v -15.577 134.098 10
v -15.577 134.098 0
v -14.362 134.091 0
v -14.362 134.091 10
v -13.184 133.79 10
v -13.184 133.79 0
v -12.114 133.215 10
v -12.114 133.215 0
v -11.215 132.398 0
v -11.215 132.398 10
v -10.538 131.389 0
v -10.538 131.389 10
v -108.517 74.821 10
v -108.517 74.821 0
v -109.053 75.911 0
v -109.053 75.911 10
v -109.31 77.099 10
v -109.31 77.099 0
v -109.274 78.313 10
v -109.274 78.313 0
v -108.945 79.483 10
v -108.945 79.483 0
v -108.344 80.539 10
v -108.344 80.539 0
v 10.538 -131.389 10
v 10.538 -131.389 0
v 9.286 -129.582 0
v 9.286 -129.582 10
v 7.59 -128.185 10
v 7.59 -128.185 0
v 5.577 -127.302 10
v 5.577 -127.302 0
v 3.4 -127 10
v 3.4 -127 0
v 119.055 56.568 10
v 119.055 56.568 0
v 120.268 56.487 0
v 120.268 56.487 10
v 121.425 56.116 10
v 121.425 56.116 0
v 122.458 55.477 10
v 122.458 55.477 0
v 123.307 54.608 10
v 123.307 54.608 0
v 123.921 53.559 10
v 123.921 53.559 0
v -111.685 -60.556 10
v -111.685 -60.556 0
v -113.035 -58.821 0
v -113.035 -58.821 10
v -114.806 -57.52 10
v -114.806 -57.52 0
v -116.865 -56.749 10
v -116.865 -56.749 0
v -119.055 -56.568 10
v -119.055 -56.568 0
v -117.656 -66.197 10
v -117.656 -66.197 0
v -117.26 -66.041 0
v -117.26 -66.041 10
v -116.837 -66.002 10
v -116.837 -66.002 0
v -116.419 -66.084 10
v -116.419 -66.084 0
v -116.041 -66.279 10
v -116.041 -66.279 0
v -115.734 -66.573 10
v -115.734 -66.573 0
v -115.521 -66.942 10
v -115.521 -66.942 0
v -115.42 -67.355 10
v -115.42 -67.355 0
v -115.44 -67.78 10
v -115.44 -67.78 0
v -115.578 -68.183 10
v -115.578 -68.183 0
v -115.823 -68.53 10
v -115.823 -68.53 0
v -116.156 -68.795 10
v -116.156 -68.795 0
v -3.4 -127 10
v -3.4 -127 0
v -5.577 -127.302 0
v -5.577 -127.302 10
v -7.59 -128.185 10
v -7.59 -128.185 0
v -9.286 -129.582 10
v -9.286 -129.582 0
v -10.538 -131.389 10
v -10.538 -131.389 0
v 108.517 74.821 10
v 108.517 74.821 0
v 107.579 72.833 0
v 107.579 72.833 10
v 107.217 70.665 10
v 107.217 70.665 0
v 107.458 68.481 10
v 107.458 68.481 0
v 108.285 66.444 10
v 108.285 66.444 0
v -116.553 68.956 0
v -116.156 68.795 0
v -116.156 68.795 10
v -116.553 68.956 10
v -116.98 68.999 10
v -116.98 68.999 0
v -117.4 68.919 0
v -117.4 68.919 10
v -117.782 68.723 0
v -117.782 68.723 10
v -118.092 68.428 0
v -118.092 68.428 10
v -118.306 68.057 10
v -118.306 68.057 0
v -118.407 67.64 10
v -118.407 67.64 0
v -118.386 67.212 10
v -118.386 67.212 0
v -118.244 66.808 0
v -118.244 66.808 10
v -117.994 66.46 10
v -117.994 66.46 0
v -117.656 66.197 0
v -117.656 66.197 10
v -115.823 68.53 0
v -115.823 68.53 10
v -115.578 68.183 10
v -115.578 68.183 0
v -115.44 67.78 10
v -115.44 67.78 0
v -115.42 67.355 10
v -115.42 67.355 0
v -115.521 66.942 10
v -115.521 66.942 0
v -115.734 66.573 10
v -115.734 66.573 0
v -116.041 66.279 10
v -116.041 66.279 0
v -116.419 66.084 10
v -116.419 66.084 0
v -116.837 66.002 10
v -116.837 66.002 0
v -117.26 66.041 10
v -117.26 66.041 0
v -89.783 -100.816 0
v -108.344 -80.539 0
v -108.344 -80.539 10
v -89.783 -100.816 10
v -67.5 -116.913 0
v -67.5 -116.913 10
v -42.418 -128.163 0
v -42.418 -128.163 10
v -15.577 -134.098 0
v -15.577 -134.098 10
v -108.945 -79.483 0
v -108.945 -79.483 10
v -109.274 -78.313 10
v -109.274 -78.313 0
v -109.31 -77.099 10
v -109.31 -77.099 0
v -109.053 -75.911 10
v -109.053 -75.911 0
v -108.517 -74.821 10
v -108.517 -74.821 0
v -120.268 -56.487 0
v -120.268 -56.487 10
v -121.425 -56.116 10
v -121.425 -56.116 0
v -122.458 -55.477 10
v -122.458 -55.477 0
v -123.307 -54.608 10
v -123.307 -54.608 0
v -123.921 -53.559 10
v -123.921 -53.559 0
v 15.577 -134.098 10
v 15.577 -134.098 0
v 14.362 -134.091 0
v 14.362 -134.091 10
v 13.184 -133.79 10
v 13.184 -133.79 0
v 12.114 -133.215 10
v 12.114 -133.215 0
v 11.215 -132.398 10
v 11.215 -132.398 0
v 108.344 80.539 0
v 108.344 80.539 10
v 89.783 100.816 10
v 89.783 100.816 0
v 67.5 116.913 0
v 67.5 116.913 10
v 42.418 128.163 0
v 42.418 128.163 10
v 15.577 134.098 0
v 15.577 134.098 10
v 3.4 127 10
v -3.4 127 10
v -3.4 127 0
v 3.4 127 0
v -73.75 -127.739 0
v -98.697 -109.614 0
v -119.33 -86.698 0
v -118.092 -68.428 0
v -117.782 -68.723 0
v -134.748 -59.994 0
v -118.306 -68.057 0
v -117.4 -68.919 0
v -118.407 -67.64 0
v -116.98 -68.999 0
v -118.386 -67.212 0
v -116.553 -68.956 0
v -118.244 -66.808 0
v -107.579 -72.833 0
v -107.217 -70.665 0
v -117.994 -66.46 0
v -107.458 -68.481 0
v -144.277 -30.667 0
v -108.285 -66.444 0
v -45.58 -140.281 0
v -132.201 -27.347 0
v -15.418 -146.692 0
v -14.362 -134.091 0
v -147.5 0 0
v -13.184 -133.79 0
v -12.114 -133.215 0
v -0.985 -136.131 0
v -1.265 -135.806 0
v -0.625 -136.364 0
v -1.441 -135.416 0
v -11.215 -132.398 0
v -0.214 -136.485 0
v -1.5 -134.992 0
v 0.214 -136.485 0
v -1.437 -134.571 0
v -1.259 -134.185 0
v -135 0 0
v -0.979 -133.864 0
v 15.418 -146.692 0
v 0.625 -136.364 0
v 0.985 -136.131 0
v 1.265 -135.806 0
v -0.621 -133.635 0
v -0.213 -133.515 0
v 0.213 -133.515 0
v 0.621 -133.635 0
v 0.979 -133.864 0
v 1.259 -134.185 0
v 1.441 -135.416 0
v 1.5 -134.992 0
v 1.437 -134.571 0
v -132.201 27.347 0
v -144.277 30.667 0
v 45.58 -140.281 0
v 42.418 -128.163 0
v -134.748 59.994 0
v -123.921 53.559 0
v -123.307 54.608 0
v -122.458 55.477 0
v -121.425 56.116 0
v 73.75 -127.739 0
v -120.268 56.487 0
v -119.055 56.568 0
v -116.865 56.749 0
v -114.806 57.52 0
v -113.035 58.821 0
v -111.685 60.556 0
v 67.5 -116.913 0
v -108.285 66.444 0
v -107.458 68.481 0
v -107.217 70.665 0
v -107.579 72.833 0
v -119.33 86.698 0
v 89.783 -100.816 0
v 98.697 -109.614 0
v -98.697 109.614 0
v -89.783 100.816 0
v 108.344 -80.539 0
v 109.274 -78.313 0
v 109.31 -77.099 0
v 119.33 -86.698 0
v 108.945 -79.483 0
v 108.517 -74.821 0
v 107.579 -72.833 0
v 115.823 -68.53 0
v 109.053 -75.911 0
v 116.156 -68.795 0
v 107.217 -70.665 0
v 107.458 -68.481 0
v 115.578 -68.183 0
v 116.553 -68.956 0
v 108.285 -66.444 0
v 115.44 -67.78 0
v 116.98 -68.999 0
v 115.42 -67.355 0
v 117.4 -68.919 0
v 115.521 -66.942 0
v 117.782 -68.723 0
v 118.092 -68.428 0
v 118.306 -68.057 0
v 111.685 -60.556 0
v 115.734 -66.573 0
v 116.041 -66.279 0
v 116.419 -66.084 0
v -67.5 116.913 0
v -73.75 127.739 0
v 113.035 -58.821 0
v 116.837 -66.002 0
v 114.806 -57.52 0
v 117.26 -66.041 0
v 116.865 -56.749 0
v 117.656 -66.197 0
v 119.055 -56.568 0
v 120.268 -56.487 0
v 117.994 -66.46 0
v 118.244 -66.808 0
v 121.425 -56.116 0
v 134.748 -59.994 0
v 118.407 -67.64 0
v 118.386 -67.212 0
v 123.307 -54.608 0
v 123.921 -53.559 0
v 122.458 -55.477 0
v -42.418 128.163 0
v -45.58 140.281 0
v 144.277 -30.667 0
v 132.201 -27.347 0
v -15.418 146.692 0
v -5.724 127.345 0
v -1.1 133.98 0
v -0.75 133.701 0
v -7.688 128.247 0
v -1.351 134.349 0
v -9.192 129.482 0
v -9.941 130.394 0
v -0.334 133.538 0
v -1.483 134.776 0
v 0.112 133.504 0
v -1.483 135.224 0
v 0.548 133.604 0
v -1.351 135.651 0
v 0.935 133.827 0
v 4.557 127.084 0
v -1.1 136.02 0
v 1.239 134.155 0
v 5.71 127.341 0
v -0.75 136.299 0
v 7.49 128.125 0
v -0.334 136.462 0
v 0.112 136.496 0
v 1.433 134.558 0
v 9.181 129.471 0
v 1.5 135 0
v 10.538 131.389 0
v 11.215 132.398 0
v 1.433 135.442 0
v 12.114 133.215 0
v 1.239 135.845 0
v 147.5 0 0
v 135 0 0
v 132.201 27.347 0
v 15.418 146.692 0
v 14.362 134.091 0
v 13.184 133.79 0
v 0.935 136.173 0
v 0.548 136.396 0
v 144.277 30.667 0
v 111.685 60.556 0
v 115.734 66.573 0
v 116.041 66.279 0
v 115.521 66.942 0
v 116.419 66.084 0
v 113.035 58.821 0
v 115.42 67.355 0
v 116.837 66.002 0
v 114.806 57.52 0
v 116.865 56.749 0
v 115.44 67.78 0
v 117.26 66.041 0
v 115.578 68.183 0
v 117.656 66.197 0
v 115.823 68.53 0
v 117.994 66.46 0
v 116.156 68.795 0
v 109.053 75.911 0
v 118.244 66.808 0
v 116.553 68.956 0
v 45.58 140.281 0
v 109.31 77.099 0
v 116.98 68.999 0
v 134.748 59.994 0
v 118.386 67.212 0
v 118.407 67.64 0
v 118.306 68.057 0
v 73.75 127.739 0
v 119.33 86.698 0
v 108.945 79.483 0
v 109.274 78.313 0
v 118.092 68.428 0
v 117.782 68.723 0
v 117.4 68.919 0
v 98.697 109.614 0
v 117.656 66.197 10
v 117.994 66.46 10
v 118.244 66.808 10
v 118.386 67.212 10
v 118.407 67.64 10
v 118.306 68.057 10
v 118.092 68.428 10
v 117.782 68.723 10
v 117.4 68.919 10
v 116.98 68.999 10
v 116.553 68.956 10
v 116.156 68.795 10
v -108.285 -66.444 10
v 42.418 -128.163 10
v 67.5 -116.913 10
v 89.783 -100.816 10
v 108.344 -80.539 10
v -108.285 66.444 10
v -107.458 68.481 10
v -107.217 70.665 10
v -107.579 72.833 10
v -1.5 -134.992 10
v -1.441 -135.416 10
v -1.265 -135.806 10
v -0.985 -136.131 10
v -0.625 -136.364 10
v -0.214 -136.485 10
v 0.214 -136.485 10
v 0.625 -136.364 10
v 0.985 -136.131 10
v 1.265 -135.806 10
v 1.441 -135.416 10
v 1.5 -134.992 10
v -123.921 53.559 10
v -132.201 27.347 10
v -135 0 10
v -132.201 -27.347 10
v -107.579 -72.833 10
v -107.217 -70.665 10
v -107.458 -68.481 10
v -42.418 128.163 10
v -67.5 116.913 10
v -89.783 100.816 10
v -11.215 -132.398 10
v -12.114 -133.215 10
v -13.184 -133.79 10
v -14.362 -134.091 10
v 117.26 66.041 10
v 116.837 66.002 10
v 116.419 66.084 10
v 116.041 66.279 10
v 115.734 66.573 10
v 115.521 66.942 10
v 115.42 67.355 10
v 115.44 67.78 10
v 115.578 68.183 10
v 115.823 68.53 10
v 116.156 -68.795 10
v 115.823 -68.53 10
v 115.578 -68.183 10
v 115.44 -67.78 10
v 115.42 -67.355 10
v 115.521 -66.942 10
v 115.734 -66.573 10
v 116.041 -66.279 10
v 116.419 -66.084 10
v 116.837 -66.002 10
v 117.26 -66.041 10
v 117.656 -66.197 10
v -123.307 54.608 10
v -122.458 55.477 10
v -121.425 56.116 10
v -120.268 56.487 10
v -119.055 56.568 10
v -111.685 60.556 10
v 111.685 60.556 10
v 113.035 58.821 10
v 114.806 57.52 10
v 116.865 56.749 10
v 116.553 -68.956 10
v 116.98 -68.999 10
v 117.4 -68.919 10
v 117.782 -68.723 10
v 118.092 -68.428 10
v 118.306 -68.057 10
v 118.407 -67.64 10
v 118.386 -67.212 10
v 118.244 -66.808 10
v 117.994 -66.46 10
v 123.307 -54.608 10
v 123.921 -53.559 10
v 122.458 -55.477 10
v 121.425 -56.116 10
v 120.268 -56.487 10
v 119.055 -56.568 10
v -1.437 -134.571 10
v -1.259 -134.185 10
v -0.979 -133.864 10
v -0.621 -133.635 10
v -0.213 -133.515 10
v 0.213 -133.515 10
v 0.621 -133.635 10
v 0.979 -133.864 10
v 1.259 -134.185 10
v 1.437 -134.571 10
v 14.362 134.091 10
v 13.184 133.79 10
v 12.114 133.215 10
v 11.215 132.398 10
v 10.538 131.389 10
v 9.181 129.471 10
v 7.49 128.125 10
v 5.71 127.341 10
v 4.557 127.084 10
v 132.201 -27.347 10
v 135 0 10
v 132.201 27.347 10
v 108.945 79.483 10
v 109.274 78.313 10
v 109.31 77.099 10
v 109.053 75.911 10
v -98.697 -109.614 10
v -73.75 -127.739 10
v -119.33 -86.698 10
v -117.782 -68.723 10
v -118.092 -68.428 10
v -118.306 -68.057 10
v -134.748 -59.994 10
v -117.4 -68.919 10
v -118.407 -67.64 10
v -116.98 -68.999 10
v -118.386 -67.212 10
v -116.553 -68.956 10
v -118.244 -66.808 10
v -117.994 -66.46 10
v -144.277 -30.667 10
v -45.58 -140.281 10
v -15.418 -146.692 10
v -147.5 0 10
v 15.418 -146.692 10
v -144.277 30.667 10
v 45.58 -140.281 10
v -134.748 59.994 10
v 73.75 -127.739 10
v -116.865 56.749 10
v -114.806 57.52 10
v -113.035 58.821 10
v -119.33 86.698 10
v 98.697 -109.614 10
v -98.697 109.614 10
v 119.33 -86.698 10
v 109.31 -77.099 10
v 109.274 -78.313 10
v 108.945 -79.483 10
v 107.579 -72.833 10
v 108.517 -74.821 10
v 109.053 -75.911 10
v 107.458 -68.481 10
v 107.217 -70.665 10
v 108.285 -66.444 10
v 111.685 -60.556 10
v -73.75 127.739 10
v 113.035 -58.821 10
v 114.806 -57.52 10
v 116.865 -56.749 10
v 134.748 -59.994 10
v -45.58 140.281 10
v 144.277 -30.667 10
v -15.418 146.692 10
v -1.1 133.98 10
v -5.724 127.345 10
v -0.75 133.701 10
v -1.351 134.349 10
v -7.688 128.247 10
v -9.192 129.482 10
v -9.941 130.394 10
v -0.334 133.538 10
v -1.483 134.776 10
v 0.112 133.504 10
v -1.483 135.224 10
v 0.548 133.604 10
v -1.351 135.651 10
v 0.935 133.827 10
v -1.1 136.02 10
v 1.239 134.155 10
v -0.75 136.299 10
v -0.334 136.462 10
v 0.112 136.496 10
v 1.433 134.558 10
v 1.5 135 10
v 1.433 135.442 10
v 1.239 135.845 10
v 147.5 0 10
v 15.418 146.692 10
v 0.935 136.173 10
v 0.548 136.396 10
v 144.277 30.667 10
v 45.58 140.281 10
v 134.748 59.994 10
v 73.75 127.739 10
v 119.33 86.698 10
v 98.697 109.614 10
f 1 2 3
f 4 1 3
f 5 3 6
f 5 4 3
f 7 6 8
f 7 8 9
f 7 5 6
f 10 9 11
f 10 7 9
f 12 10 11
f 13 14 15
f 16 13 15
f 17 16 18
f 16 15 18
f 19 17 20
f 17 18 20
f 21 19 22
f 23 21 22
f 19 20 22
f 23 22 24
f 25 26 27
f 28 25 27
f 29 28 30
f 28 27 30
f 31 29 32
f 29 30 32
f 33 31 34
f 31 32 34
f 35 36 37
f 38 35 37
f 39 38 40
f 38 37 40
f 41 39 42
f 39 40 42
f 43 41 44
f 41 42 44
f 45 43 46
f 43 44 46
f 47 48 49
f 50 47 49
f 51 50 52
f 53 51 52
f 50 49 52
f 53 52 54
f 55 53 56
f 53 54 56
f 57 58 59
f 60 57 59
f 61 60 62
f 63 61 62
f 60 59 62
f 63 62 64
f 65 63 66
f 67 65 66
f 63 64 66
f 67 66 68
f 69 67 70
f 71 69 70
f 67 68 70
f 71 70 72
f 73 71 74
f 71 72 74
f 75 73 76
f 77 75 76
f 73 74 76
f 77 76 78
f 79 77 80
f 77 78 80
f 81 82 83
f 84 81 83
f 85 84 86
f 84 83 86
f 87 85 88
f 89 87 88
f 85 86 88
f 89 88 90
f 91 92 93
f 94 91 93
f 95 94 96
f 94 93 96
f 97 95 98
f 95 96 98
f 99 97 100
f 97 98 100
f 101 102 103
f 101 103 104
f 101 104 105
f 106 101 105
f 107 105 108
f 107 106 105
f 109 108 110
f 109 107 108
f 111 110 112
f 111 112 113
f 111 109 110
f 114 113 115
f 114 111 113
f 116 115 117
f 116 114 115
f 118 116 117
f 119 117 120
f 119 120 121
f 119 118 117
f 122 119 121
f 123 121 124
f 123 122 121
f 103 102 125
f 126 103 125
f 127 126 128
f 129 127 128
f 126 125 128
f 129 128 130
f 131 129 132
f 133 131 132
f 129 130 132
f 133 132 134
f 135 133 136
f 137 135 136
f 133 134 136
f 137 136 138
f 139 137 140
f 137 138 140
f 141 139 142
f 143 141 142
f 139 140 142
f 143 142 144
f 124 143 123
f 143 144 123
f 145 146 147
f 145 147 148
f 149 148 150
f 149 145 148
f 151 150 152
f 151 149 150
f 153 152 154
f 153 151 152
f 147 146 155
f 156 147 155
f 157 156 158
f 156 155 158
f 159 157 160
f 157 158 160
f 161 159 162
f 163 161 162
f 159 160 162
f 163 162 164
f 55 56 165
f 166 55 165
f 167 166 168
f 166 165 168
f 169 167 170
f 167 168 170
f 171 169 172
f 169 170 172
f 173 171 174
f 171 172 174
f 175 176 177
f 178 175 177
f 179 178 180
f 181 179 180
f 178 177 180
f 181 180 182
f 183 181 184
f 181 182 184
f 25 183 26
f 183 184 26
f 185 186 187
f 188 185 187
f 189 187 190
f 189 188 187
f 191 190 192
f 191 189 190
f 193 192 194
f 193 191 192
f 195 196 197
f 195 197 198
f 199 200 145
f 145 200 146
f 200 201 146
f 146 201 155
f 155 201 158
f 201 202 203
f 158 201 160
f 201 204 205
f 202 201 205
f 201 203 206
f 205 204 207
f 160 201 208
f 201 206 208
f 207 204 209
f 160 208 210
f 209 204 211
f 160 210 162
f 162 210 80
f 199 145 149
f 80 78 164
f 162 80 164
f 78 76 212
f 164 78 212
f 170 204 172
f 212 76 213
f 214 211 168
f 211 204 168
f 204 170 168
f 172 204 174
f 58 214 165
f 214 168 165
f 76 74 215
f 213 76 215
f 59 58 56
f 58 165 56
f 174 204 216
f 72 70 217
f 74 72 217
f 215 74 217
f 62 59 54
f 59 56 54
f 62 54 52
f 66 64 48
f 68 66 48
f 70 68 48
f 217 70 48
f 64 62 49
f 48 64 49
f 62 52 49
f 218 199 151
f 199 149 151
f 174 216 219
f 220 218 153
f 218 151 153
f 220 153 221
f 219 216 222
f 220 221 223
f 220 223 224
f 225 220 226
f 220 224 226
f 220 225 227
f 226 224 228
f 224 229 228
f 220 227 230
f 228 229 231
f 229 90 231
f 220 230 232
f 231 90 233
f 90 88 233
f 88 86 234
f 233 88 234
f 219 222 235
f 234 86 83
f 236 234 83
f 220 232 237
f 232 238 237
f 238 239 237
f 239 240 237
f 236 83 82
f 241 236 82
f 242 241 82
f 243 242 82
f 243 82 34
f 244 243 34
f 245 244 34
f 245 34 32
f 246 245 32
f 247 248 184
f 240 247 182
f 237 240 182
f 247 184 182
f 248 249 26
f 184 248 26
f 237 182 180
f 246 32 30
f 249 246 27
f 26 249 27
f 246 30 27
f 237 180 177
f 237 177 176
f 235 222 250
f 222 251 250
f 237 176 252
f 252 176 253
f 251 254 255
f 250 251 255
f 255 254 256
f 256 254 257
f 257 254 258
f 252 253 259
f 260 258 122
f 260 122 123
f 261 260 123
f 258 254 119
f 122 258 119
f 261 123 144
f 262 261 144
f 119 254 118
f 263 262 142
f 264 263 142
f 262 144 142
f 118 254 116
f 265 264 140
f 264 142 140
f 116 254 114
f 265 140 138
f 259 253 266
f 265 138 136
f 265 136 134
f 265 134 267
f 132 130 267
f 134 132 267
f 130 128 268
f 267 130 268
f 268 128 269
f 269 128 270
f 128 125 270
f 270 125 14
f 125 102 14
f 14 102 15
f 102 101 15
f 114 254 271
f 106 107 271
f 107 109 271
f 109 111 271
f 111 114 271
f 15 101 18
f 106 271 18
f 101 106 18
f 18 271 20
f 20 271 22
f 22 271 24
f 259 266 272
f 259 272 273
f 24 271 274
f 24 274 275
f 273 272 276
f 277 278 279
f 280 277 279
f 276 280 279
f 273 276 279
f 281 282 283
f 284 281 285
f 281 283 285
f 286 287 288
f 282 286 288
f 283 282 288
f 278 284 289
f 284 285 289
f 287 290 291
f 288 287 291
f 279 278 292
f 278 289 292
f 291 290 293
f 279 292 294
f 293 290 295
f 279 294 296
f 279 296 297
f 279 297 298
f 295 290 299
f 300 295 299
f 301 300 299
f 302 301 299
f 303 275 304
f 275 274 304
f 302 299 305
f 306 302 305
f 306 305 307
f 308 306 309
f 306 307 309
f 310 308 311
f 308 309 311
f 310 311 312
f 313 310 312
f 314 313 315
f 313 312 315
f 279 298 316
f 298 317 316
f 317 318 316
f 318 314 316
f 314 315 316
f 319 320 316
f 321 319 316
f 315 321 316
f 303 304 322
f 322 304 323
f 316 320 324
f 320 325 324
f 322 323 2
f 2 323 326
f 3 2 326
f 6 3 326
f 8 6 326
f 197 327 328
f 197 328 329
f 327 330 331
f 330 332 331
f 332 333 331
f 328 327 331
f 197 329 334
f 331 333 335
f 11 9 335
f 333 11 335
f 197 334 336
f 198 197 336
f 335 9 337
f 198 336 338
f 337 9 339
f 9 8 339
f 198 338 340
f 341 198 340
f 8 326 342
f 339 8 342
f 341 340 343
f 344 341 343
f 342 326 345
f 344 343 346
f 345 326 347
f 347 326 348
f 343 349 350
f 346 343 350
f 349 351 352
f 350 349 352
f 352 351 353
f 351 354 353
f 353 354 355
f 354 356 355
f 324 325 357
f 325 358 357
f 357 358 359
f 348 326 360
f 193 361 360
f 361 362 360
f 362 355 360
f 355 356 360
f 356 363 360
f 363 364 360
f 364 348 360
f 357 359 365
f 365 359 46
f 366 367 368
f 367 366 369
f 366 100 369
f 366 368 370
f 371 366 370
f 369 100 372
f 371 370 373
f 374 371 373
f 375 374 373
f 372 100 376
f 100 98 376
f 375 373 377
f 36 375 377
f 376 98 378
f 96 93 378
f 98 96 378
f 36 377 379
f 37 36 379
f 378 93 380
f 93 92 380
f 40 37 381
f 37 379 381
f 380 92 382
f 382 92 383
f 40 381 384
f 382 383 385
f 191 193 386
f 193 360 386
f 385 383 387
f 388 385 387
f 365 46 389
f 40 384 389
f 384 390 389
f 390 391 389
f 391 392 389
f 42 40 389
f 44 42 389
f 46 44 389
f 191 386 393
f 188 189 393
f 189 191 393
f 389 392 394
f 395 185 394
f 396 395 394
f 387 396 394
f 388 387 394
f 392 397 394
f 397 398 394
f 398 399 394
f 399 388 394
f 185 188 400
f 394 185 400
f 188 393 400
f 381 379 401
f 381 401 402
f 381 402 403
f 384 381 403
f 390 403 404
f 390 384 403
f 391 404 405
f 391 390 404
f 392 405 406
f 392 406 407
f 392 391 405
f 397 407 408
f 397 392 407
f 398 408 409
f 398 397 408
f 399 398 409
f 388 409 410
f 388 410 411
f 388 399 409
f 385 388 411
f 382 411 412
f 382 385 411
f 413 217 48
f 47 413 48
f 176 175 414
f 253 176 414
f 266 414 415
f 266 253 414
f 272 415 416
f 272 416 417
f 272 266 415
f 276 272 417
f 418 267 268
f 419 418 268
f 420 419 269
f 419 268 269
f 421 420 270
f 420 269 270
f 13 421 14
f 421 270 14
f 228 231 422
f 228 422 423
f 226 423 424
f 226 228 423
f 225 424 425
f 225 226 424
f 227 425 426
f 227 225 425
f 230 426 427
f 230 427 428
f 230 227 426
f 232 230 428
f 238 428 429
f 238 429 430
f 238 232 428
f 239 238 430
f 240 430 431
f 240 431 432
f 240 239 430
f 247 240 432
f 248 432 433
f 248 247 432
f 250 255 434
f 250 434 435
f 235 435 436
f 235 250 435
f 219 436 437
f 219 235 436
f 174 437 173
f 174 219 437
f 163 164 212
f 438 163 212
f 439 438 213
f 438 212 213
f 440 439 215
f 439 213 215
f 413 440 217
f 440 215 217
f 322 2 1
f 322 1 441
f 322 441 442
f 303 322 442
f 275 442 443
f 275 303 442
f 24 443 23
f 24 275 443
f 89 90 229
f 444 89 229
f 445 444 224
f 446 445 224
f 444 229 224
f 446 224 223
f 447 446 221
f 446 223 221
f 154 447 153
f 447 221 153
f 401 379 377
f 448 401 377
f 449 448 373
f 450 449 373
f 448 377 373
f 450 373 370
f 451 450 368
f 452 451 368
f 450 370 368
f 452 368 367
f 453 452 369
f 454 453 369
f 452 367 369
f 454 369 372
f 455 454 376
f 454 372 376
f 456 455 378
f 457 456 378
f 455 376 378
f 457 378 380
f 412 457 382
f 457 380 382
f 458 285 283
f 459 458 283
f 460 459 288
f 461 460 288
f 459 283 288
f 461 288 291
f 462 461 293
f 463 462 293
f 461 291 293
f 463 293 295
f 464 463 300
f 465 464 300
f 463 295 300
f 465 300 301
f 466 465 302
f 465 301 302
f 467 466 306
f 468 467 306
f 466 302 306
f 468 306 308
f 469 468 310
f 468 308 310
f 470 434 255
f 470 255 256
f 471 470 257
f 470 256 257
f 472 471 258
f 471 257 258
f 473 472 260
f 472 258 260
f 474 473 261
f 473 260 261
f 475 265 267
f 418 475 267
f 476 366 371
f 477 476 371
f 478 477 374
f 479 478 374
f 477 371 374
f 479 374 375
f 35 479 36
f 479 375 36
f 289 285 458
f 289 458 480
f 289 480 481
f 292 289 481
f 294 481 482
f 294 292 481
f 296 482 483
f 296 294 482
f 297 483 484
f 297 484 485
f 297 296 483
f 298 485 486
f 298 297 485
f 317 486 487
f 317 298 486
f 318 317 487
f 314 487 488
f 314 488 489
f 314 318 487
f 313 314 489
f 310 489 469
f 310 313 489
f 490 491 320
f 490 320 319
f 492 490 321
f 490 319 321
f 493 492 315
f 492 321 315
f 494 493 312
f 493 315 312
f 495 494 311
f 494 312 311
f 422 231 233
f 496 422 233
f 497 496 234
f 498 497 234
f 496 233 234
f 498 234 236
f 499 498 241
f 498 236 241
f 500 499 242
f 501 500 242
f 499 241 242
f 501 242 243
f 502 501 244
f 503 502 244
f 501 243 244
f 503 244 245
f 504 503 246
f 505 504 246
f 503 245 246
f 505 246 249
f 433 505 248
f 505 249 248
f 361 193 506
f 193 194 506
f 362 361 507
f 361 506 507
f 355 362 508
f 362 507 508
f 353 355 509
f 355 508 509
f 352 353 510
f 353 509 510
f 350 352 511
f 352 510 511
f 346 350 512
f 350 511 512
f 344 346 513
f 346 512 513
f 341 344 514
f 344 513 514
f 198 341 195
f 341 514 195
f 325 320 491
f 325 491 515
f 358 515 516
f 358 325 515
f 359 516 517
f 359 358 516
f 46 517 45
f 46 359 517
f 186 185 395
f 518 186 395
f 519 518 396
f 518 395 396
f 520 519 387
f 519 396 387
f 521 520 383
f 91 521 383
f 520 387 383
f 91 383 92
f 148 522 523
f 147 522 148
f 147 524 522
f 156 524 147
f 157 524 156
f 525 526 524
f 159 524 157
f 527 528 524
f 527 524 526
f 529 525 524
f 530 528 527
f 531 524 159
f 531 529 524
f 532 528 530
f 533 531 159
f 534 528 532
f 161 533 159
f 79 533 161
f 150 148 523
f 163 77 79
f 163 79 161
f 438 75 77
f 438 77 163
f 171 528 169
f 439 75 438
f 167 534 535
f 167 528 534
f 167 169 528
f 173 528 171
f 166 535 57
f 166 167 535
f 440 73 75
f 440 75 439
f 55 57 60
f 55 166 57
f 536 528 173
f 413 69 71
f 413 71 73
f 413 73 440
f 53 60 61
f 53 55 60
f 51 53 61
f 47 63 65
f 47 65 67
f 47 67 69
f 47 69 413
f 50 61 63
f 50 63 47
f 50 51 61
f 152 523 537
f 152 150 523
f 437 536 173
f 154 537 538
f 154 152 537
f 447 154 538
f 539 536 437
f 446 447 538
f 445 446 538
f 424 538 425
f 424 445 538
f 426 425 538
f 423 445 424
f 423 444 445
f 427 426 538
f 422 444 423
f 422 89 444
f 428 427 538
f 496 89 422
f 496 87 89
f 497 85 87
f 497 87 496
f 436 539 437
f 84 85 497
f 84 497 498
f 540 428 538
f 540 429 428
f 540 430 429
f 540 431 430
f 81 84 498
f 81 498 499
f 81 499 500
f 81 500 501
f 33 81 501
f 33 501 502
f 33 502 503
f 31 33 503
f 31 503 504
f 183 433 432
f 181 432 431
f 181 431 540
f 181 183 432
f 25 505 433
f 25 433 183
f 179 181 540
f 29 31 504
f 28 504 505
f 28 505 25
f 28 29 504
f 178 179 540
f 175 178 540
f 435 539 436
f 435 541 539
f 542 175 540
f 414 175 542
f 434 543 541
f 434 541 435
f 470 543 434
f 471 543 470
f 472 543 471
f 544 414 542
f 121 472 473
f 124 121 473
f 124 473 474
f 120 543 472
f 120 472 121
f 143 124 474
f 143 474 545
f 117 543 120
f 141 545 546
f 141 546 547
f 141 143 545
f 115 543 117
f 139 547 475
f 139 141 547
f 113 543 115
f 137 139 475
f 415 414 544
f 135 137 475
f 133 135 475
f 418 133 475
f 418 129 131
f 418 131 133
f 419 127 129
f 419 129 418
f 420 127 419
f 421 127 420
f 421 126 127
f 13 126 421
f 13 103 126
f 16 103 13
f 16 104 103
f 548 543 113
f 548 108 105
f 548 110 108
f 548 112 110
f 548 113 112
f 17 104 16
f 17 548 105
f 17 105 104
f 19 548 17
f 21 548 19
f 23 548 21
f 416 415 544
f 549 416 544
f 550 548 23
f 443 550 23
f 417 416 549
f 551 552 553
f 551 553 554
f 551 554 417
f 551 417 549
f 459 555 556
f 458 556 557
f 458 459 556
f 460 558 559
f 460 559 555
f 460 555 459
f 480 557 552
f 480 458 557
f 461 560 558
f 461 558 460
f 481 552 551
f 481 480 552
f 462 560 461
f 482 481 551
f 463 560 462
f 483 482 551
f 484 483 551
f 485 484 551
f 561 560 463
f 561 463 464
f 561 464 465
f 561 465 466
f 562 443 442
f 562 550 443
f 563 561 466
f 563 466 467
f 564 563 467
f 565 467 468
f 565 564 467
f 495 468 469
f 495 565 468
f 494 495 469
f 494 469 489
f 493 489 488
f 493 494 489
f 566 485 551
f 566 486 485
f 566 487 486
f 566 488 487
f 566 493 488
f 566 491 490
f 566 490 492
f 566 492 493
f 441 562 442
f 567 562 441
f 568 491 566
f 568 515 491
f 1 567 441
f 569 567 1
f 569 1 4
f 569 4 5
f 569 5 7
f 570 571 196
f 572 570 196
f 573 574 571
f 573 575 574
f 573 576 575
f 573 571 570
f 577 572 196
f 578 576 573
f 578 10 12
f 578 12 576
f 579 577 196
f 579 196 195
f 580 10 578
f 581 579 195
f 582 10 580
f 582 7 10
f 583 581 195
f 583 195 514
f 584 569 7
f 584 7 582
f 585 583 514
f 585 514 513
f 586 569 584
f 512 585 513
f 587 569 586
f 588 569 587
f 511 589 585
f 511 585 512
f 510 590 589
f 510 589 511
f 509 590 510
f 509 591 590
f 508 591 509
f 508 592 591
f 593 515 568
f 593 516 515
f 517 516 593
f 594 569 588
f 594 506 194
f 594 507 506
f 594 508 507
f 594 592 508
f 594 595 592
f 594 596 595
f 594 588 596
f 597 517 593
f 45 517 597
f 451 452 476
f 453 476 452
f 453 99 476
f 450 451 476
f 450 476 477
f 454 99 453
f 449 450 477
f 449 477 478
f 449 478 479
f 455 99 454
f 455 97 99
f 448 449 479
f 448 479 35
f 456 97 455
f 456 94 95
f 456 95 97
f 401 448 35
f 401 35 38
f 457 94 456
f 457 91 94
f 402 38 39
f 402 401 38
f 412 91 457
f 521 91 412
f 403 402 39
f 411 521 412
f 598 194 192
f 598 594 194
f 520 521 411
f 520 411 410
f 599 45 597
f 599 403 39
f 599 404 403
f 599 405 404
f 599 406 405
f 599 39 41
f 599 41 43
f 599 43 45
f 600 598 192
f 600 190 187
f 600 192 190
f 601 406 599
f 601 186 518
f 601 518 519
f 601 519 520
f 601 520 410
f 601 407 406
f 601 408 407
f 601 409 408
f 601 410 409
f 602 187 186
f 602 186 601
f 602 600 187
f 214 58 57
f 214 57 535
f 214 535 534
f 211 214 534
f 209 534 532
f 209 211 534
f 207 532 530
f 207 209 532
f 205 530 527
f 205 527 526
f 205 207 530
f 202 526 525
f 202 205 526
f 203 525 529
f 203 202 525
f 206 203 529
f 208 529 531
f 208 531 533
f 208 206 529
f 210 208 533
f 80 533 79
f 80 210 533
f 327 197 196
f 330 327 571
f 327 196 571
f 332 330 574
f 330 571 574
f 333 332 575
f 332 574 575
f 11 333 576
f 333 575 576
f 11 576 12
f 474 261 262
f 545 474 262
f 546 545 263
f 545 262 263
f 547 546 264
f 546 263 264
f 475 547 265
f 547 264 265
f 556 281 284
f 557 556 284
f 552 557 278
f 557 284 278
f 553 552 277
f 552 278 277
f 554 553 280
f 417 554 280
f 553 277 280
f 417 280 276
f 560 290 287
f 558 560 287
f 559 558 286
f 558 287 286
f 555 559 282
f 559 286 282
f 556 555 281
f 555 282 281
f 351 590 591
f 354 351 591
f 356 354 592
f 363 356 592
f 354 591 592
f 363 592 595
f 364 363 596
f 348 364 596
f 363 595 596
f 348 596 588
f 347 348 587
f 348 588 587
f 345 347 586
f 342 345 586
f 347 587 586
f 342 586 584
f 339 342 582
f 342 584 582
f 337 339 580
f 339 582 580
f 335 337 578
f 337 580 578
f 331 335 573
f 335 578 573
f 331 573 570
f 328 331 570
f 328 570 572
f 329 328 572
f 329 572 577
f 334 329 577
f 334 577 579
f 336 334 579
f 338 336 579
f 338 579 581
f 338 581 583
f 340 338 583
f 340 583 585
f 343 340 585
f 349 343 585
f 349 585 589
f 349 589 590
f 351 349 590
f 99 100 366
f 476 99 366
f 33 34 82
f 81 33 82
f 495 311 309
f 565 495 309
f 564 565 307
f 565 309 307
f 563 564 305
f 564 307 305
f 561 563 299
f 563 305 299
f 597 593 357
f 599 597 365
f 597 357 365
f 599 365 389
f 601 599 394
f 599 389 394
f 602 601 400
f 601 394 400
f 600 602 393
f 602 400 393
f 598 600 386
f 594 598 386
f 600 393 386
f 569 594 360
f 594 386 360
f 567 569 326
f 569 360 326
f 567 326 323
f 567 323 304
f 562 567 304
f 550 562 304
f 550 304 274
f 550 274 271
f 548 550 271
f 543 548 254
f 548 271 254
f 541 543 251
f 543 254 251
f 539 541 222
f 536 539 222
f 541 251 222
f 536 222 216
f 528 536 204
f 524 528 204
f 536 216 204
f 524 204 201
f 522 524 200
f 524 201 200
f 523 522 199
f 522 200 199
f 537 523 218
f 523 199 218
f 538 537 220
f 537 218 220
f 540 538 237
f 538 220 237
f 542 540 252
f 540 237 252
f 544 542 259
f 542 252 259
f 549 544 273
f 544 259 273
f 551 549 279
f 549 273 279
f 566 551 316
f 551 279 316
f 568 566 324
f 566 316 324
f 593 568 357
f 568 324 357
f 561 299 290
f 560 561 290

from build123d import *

# Parameters (mm, degrees)
SKETCH1_R           = 147.5
SKETCH1_R_2         = 135
BOSS_EXTRUDE1_DEPTH = 10
BOSS_EXTRUDE2_START = -10
BOSS_EXTRUDE2_DEPTH = 10
FILLET1_R           = 5
FILLET2_R           = 8
CUT_EXTRUDE1_REACH  = 210.836
SKETCH5_R           = 1.5
CIRPATTERN1_DEPTH   = 10
CIRPATTERN1_2_DEPTH = 10


# Read off the part's stored shape, not the designer's step: CirPattern1
with BuildPart() as part:
    # Sketch1 → Boss-Extrude1 (new body)
    with BuildSketch(Plane.XY):
        Circle(SKETCH1_R)
        Circle(SKETCH1_R_2, mode=Mode.SUBTRACT)
    extrude(amount=BOSS_EXTRUDE1_DEPTH)

    # Sketch3 → Boss-Extrude2 (add)
    with BuildSketch(Plane.XY.offset(10).offset(BOSS_EXTRUDE2_START)):
        with BuildLine():
            Line((-10, 127), (10, 127))
            Line((10, 127), (10, 134.629120178))
            ThreePointArc((10, 134.629120178), (0, 135), (-10, 134.629120178))
            Line((-10, 134.629120178), (-10, 127))
        make_face()
    extrude(amount=BOSS_EXTRUDE2_DEPTH)

    # Fillet1
    fillet1_edges = [part.edges().sort_by_distance(p)[0] for p in [
        (-10, 134.629120178, 5),
        (10, 134.629120178, 5),
    ]]
    fillet(fillet1_edges, radius=FILLET1_R)

    # Fillet2
    fillet2_edges = [part.edges().sort_by_distance(p)[0] for p in [
        (10, 127, 5),
        (-10, 127, 5),
    ]]
    fillet(fillet2_edges, radius=FILLET2_R)

    # Sketch5 → Cut-Extrude1 (cut, up to next)
    with BuildSketch(Plane.XY.offset(10), mode=Mode.PRIVATE) as cut_extrude1_sk1:
        with Locations((0, 135)):
            Circle(SKETCH5_R)
    cut_extrude1_tool1 = extrude(cut_extrude1_sk1.sketch, amount=-CUT_EXTRUDE1_REACH, mode=Mode.PRIVATE) & part.part
    add(cut_extrude1_tool1.solids().sort_by_distance((0, 135, 10))[0], mode=Mode.SUBTRACT)

    # CirPattern1 outline → CirPattern1 (cut)
    with BuildSketch(Plane.XY):
        with BuildLine():
            ThreePointArc((-116.156224207, 68.794851392), (-118.212467617, 68.25), (-117.656201059, 66.196815275))
            ThreePointArc((-117.656201059, 66.196815275), (-116.913429511, 67.5), (-116.156224207, 68.794851392))
        make_face()
        with BuildLine():
            ThreePointArc((-116.156224207, -68.794851392), (-116.913429511, -67.5), (-117.656201059, -66.196815275))
            ThreePointArc((-117.656201059, -66.196815275), (-118.212467617, -68.25), (-116.156224207, -68.794851392))
        make_face()
        with BuildLine():
            ThreePointArc((1.499976852, -134.991666667), (0, -135), (-1.499976852, -134.991666667))
            ThreePointArc((-1.499976852, -134.991666667), (0, -136.5), (1.499976852, -134.991666667))
        make_face()
        with BuildLine():
            ThreePointArc((117.656201059, -66.196815275), (116.913429511, -67.5), (116.156224207, -68.794851392))
            ThreePointArc((116.156224207, -68.794851392), (118.212467617, -68.25), (117.656201059, -66.196815275))
        make_face()
        with BuildLine():
            ThreePointArc((116.156224207, 68.794851392), (116.913429511, 67.5), (117.656201059, 66.196815275))
            ThreePointArc((117.656201059, 66.196815275), (118.212467617, 68.25), (116.156224207, 68.794851392))
        make_face()
    extrude(amount=CIRPATTERN1_DEPTH, mode=Mode.SUBTRACT)

    # CirPattern1 2 outline → CirPattern1 2 (add)
    with BuildSketch(Plane.XY):
        with BuildLine():
            ThreePointArc((-119.055197564, 56.567845161), (-114.80628077, 57.519573858), (-111.685156467, 60.555634549))
            Line((-111.685156467, 60.555634549), (-108.285296095, 66.444365451))
            ThreePointArc((-108.285296095, 66.444365451), (-107.216552561, 70.665368732), (-108.516789729, 74.820902963))
            ThreePointArc((-108.516789729, 74.820902963), (-109.329067487, 77.707176829), (-108.344090318, 80.539171173))
            ThreePointArc((-108.344090318, 80.539171173), (-112.403647927, 74.76911082), (-116.156224207, 68.794851392))
            ThreePointArc((-116.156224207, 68.794851392), (-115.614391405, 66.75), (-117.656201059, 66.196815275))
            ThreePointArc((-117.656201059, 66.196815275), (-120.953773352, 59.959859172), (-123.921013395, 53.559148978))
            ThreePointArc((-123.921013395, 53.559148978), (-121.960922934, 55.828161401), (-119.055197564, 56.567845161))
        make_face()
        with BuildLine():
            ThreePointArc((119.055197564, 56.567845161), (121.960922934, 55.828161401), (123.921013394, 53.559148978))
            ThreePointArc((123.921013394, 53.559148978), (120.953773352, 59.959859172), (117.656201059, 66.196815275))
            ThreePointArc((117.656201059, 66.196815275), (115.614391405, 66.75), (116.156224207, 68.794851392))
            ThreePointArc((116.156224207, 68.794851392), (112.403647927, 74.76911082), (108.344090318, 80.539171173))
            ThreePointArc((108.344090318, 80.539171173), (109.329067487, 77.707176829), (108.516789729, 74.820902963))
            ThreePointArc((108.516789729, 74.820902963), (107.216552561, 70.665368732), (108.285296095, 66.444365451))
            Line((108.285296095, 66.444365451), (111.685156467, 60.555634549))
            ThreePointArc((111.685156467, 60.555634549), (114.80628077, 57.519573858), (119.055197564, 56.567845161))
        make_face()
        with BuildLine():
            ThreePointArc((108.516789729, -74.820902963), (109.329067487, -77.707176829), (108.344090318, -80.539171173))
            ThreePointArc((108.344090318, -80.539171173), (112.403647927, -74.76911082), (116.156224207, -68.794851392))
            ThreePointArc((116.156224207, -68.794851392), (115.614391405, -66.75), (117.656201059, -66.196815275))
            ThreePointArc((117.656201059, -66.196815275), (120.953773352, -59.959859172), (123.921013395, -53.559148978))
            ThreePointArc((123.921013395, -53.559148978), (121.960922934, -55.828161401), (119.055197564, -56.567845161))
            ThreePointArc((119.055197564, -56.567845161), (114.80628077, -57.519573858), (111.685156467, -60.555634549))
            Line((111.685156467, -60.555634549), (108.285296095, -66.444365451))
            ThreePointArc((108.285296095, -66.444365451), (107.216552561, -70.665368732), (108.516789729, -74.820902963))
        make_face()
        with BuildLine():
            ThreePointArc((-10.538407835, -131.388748124), (-12.631855447, -133.53533823), (-15.576923077, -134.098320152))
            ThreePointArc((-15.576923077, -134.098320152), (-8.550125426, -134.728969992), (-1.499976852, -134.991666667))
            ThreePointArc((-1.499976852, -134.991666667), (0, -133.5), (1.499976852, -134.991666667))
            ThreePointArc((1.499976852, -134.991666667), (8.550125426, -134.728969992), (15.576923077, -134.098320152))
            ThreePointArc((15.576923077, -134.098320152), (12.631855447, -133.53533823), (10.538407835, -131.388748124))
            ThreePointArc((10.538407835, -131.388748124), (7.589728209, -128.18494259), (3.399860372, -127))
            Line((3.399860372, -127), (-3.399860372, -127))
            ThreePointArc((-3.399860372, -127), (-7.589728209, -128.18494259), (-10.538407835, -131.388748124))
        make_face()
        with BuildLine():
            ThreePointArc((-119.055197564, -56.567845161), (-121.960922934, -55.828161401), (-123.921013394, -53.559148978))
            ThreePointArc((-123.921013394, -53.559148978), (-120.953773352, -59.959859172), (-117.656201059, -66.196815275))
            ThreePointArc((-117.656201059, -66.196815275), (-115.614391405, -66.75), (-116.156224207, -68.794851392))
            ThreePointArc((-116.156224207, -68.794851392), (-112.403647927, -74.76911082), (-108.344090318, -80.539171173))
            ThreePointArc((-108.344090318, -80.539171173), (-109.329067487, -77.707176829), (-108.516789729, -74.820902963))
            ThreePointArc((-108.516789729, -74.820902963), (-107.216552561, -70.665368732), (-108.285296095, -66.444365451))
            Line((-108.285296095, -66.444365451), (-111.685156467, -60.555634549))
            ThreePointArc((-111.685156467, -60.555634549), (-114.80628077, -57.519573858), (-119.055197564, -56.567845161))
        make_face()
    extrude(amount=CIRPATTERN1_2_DEPTH)


solid = part.part
